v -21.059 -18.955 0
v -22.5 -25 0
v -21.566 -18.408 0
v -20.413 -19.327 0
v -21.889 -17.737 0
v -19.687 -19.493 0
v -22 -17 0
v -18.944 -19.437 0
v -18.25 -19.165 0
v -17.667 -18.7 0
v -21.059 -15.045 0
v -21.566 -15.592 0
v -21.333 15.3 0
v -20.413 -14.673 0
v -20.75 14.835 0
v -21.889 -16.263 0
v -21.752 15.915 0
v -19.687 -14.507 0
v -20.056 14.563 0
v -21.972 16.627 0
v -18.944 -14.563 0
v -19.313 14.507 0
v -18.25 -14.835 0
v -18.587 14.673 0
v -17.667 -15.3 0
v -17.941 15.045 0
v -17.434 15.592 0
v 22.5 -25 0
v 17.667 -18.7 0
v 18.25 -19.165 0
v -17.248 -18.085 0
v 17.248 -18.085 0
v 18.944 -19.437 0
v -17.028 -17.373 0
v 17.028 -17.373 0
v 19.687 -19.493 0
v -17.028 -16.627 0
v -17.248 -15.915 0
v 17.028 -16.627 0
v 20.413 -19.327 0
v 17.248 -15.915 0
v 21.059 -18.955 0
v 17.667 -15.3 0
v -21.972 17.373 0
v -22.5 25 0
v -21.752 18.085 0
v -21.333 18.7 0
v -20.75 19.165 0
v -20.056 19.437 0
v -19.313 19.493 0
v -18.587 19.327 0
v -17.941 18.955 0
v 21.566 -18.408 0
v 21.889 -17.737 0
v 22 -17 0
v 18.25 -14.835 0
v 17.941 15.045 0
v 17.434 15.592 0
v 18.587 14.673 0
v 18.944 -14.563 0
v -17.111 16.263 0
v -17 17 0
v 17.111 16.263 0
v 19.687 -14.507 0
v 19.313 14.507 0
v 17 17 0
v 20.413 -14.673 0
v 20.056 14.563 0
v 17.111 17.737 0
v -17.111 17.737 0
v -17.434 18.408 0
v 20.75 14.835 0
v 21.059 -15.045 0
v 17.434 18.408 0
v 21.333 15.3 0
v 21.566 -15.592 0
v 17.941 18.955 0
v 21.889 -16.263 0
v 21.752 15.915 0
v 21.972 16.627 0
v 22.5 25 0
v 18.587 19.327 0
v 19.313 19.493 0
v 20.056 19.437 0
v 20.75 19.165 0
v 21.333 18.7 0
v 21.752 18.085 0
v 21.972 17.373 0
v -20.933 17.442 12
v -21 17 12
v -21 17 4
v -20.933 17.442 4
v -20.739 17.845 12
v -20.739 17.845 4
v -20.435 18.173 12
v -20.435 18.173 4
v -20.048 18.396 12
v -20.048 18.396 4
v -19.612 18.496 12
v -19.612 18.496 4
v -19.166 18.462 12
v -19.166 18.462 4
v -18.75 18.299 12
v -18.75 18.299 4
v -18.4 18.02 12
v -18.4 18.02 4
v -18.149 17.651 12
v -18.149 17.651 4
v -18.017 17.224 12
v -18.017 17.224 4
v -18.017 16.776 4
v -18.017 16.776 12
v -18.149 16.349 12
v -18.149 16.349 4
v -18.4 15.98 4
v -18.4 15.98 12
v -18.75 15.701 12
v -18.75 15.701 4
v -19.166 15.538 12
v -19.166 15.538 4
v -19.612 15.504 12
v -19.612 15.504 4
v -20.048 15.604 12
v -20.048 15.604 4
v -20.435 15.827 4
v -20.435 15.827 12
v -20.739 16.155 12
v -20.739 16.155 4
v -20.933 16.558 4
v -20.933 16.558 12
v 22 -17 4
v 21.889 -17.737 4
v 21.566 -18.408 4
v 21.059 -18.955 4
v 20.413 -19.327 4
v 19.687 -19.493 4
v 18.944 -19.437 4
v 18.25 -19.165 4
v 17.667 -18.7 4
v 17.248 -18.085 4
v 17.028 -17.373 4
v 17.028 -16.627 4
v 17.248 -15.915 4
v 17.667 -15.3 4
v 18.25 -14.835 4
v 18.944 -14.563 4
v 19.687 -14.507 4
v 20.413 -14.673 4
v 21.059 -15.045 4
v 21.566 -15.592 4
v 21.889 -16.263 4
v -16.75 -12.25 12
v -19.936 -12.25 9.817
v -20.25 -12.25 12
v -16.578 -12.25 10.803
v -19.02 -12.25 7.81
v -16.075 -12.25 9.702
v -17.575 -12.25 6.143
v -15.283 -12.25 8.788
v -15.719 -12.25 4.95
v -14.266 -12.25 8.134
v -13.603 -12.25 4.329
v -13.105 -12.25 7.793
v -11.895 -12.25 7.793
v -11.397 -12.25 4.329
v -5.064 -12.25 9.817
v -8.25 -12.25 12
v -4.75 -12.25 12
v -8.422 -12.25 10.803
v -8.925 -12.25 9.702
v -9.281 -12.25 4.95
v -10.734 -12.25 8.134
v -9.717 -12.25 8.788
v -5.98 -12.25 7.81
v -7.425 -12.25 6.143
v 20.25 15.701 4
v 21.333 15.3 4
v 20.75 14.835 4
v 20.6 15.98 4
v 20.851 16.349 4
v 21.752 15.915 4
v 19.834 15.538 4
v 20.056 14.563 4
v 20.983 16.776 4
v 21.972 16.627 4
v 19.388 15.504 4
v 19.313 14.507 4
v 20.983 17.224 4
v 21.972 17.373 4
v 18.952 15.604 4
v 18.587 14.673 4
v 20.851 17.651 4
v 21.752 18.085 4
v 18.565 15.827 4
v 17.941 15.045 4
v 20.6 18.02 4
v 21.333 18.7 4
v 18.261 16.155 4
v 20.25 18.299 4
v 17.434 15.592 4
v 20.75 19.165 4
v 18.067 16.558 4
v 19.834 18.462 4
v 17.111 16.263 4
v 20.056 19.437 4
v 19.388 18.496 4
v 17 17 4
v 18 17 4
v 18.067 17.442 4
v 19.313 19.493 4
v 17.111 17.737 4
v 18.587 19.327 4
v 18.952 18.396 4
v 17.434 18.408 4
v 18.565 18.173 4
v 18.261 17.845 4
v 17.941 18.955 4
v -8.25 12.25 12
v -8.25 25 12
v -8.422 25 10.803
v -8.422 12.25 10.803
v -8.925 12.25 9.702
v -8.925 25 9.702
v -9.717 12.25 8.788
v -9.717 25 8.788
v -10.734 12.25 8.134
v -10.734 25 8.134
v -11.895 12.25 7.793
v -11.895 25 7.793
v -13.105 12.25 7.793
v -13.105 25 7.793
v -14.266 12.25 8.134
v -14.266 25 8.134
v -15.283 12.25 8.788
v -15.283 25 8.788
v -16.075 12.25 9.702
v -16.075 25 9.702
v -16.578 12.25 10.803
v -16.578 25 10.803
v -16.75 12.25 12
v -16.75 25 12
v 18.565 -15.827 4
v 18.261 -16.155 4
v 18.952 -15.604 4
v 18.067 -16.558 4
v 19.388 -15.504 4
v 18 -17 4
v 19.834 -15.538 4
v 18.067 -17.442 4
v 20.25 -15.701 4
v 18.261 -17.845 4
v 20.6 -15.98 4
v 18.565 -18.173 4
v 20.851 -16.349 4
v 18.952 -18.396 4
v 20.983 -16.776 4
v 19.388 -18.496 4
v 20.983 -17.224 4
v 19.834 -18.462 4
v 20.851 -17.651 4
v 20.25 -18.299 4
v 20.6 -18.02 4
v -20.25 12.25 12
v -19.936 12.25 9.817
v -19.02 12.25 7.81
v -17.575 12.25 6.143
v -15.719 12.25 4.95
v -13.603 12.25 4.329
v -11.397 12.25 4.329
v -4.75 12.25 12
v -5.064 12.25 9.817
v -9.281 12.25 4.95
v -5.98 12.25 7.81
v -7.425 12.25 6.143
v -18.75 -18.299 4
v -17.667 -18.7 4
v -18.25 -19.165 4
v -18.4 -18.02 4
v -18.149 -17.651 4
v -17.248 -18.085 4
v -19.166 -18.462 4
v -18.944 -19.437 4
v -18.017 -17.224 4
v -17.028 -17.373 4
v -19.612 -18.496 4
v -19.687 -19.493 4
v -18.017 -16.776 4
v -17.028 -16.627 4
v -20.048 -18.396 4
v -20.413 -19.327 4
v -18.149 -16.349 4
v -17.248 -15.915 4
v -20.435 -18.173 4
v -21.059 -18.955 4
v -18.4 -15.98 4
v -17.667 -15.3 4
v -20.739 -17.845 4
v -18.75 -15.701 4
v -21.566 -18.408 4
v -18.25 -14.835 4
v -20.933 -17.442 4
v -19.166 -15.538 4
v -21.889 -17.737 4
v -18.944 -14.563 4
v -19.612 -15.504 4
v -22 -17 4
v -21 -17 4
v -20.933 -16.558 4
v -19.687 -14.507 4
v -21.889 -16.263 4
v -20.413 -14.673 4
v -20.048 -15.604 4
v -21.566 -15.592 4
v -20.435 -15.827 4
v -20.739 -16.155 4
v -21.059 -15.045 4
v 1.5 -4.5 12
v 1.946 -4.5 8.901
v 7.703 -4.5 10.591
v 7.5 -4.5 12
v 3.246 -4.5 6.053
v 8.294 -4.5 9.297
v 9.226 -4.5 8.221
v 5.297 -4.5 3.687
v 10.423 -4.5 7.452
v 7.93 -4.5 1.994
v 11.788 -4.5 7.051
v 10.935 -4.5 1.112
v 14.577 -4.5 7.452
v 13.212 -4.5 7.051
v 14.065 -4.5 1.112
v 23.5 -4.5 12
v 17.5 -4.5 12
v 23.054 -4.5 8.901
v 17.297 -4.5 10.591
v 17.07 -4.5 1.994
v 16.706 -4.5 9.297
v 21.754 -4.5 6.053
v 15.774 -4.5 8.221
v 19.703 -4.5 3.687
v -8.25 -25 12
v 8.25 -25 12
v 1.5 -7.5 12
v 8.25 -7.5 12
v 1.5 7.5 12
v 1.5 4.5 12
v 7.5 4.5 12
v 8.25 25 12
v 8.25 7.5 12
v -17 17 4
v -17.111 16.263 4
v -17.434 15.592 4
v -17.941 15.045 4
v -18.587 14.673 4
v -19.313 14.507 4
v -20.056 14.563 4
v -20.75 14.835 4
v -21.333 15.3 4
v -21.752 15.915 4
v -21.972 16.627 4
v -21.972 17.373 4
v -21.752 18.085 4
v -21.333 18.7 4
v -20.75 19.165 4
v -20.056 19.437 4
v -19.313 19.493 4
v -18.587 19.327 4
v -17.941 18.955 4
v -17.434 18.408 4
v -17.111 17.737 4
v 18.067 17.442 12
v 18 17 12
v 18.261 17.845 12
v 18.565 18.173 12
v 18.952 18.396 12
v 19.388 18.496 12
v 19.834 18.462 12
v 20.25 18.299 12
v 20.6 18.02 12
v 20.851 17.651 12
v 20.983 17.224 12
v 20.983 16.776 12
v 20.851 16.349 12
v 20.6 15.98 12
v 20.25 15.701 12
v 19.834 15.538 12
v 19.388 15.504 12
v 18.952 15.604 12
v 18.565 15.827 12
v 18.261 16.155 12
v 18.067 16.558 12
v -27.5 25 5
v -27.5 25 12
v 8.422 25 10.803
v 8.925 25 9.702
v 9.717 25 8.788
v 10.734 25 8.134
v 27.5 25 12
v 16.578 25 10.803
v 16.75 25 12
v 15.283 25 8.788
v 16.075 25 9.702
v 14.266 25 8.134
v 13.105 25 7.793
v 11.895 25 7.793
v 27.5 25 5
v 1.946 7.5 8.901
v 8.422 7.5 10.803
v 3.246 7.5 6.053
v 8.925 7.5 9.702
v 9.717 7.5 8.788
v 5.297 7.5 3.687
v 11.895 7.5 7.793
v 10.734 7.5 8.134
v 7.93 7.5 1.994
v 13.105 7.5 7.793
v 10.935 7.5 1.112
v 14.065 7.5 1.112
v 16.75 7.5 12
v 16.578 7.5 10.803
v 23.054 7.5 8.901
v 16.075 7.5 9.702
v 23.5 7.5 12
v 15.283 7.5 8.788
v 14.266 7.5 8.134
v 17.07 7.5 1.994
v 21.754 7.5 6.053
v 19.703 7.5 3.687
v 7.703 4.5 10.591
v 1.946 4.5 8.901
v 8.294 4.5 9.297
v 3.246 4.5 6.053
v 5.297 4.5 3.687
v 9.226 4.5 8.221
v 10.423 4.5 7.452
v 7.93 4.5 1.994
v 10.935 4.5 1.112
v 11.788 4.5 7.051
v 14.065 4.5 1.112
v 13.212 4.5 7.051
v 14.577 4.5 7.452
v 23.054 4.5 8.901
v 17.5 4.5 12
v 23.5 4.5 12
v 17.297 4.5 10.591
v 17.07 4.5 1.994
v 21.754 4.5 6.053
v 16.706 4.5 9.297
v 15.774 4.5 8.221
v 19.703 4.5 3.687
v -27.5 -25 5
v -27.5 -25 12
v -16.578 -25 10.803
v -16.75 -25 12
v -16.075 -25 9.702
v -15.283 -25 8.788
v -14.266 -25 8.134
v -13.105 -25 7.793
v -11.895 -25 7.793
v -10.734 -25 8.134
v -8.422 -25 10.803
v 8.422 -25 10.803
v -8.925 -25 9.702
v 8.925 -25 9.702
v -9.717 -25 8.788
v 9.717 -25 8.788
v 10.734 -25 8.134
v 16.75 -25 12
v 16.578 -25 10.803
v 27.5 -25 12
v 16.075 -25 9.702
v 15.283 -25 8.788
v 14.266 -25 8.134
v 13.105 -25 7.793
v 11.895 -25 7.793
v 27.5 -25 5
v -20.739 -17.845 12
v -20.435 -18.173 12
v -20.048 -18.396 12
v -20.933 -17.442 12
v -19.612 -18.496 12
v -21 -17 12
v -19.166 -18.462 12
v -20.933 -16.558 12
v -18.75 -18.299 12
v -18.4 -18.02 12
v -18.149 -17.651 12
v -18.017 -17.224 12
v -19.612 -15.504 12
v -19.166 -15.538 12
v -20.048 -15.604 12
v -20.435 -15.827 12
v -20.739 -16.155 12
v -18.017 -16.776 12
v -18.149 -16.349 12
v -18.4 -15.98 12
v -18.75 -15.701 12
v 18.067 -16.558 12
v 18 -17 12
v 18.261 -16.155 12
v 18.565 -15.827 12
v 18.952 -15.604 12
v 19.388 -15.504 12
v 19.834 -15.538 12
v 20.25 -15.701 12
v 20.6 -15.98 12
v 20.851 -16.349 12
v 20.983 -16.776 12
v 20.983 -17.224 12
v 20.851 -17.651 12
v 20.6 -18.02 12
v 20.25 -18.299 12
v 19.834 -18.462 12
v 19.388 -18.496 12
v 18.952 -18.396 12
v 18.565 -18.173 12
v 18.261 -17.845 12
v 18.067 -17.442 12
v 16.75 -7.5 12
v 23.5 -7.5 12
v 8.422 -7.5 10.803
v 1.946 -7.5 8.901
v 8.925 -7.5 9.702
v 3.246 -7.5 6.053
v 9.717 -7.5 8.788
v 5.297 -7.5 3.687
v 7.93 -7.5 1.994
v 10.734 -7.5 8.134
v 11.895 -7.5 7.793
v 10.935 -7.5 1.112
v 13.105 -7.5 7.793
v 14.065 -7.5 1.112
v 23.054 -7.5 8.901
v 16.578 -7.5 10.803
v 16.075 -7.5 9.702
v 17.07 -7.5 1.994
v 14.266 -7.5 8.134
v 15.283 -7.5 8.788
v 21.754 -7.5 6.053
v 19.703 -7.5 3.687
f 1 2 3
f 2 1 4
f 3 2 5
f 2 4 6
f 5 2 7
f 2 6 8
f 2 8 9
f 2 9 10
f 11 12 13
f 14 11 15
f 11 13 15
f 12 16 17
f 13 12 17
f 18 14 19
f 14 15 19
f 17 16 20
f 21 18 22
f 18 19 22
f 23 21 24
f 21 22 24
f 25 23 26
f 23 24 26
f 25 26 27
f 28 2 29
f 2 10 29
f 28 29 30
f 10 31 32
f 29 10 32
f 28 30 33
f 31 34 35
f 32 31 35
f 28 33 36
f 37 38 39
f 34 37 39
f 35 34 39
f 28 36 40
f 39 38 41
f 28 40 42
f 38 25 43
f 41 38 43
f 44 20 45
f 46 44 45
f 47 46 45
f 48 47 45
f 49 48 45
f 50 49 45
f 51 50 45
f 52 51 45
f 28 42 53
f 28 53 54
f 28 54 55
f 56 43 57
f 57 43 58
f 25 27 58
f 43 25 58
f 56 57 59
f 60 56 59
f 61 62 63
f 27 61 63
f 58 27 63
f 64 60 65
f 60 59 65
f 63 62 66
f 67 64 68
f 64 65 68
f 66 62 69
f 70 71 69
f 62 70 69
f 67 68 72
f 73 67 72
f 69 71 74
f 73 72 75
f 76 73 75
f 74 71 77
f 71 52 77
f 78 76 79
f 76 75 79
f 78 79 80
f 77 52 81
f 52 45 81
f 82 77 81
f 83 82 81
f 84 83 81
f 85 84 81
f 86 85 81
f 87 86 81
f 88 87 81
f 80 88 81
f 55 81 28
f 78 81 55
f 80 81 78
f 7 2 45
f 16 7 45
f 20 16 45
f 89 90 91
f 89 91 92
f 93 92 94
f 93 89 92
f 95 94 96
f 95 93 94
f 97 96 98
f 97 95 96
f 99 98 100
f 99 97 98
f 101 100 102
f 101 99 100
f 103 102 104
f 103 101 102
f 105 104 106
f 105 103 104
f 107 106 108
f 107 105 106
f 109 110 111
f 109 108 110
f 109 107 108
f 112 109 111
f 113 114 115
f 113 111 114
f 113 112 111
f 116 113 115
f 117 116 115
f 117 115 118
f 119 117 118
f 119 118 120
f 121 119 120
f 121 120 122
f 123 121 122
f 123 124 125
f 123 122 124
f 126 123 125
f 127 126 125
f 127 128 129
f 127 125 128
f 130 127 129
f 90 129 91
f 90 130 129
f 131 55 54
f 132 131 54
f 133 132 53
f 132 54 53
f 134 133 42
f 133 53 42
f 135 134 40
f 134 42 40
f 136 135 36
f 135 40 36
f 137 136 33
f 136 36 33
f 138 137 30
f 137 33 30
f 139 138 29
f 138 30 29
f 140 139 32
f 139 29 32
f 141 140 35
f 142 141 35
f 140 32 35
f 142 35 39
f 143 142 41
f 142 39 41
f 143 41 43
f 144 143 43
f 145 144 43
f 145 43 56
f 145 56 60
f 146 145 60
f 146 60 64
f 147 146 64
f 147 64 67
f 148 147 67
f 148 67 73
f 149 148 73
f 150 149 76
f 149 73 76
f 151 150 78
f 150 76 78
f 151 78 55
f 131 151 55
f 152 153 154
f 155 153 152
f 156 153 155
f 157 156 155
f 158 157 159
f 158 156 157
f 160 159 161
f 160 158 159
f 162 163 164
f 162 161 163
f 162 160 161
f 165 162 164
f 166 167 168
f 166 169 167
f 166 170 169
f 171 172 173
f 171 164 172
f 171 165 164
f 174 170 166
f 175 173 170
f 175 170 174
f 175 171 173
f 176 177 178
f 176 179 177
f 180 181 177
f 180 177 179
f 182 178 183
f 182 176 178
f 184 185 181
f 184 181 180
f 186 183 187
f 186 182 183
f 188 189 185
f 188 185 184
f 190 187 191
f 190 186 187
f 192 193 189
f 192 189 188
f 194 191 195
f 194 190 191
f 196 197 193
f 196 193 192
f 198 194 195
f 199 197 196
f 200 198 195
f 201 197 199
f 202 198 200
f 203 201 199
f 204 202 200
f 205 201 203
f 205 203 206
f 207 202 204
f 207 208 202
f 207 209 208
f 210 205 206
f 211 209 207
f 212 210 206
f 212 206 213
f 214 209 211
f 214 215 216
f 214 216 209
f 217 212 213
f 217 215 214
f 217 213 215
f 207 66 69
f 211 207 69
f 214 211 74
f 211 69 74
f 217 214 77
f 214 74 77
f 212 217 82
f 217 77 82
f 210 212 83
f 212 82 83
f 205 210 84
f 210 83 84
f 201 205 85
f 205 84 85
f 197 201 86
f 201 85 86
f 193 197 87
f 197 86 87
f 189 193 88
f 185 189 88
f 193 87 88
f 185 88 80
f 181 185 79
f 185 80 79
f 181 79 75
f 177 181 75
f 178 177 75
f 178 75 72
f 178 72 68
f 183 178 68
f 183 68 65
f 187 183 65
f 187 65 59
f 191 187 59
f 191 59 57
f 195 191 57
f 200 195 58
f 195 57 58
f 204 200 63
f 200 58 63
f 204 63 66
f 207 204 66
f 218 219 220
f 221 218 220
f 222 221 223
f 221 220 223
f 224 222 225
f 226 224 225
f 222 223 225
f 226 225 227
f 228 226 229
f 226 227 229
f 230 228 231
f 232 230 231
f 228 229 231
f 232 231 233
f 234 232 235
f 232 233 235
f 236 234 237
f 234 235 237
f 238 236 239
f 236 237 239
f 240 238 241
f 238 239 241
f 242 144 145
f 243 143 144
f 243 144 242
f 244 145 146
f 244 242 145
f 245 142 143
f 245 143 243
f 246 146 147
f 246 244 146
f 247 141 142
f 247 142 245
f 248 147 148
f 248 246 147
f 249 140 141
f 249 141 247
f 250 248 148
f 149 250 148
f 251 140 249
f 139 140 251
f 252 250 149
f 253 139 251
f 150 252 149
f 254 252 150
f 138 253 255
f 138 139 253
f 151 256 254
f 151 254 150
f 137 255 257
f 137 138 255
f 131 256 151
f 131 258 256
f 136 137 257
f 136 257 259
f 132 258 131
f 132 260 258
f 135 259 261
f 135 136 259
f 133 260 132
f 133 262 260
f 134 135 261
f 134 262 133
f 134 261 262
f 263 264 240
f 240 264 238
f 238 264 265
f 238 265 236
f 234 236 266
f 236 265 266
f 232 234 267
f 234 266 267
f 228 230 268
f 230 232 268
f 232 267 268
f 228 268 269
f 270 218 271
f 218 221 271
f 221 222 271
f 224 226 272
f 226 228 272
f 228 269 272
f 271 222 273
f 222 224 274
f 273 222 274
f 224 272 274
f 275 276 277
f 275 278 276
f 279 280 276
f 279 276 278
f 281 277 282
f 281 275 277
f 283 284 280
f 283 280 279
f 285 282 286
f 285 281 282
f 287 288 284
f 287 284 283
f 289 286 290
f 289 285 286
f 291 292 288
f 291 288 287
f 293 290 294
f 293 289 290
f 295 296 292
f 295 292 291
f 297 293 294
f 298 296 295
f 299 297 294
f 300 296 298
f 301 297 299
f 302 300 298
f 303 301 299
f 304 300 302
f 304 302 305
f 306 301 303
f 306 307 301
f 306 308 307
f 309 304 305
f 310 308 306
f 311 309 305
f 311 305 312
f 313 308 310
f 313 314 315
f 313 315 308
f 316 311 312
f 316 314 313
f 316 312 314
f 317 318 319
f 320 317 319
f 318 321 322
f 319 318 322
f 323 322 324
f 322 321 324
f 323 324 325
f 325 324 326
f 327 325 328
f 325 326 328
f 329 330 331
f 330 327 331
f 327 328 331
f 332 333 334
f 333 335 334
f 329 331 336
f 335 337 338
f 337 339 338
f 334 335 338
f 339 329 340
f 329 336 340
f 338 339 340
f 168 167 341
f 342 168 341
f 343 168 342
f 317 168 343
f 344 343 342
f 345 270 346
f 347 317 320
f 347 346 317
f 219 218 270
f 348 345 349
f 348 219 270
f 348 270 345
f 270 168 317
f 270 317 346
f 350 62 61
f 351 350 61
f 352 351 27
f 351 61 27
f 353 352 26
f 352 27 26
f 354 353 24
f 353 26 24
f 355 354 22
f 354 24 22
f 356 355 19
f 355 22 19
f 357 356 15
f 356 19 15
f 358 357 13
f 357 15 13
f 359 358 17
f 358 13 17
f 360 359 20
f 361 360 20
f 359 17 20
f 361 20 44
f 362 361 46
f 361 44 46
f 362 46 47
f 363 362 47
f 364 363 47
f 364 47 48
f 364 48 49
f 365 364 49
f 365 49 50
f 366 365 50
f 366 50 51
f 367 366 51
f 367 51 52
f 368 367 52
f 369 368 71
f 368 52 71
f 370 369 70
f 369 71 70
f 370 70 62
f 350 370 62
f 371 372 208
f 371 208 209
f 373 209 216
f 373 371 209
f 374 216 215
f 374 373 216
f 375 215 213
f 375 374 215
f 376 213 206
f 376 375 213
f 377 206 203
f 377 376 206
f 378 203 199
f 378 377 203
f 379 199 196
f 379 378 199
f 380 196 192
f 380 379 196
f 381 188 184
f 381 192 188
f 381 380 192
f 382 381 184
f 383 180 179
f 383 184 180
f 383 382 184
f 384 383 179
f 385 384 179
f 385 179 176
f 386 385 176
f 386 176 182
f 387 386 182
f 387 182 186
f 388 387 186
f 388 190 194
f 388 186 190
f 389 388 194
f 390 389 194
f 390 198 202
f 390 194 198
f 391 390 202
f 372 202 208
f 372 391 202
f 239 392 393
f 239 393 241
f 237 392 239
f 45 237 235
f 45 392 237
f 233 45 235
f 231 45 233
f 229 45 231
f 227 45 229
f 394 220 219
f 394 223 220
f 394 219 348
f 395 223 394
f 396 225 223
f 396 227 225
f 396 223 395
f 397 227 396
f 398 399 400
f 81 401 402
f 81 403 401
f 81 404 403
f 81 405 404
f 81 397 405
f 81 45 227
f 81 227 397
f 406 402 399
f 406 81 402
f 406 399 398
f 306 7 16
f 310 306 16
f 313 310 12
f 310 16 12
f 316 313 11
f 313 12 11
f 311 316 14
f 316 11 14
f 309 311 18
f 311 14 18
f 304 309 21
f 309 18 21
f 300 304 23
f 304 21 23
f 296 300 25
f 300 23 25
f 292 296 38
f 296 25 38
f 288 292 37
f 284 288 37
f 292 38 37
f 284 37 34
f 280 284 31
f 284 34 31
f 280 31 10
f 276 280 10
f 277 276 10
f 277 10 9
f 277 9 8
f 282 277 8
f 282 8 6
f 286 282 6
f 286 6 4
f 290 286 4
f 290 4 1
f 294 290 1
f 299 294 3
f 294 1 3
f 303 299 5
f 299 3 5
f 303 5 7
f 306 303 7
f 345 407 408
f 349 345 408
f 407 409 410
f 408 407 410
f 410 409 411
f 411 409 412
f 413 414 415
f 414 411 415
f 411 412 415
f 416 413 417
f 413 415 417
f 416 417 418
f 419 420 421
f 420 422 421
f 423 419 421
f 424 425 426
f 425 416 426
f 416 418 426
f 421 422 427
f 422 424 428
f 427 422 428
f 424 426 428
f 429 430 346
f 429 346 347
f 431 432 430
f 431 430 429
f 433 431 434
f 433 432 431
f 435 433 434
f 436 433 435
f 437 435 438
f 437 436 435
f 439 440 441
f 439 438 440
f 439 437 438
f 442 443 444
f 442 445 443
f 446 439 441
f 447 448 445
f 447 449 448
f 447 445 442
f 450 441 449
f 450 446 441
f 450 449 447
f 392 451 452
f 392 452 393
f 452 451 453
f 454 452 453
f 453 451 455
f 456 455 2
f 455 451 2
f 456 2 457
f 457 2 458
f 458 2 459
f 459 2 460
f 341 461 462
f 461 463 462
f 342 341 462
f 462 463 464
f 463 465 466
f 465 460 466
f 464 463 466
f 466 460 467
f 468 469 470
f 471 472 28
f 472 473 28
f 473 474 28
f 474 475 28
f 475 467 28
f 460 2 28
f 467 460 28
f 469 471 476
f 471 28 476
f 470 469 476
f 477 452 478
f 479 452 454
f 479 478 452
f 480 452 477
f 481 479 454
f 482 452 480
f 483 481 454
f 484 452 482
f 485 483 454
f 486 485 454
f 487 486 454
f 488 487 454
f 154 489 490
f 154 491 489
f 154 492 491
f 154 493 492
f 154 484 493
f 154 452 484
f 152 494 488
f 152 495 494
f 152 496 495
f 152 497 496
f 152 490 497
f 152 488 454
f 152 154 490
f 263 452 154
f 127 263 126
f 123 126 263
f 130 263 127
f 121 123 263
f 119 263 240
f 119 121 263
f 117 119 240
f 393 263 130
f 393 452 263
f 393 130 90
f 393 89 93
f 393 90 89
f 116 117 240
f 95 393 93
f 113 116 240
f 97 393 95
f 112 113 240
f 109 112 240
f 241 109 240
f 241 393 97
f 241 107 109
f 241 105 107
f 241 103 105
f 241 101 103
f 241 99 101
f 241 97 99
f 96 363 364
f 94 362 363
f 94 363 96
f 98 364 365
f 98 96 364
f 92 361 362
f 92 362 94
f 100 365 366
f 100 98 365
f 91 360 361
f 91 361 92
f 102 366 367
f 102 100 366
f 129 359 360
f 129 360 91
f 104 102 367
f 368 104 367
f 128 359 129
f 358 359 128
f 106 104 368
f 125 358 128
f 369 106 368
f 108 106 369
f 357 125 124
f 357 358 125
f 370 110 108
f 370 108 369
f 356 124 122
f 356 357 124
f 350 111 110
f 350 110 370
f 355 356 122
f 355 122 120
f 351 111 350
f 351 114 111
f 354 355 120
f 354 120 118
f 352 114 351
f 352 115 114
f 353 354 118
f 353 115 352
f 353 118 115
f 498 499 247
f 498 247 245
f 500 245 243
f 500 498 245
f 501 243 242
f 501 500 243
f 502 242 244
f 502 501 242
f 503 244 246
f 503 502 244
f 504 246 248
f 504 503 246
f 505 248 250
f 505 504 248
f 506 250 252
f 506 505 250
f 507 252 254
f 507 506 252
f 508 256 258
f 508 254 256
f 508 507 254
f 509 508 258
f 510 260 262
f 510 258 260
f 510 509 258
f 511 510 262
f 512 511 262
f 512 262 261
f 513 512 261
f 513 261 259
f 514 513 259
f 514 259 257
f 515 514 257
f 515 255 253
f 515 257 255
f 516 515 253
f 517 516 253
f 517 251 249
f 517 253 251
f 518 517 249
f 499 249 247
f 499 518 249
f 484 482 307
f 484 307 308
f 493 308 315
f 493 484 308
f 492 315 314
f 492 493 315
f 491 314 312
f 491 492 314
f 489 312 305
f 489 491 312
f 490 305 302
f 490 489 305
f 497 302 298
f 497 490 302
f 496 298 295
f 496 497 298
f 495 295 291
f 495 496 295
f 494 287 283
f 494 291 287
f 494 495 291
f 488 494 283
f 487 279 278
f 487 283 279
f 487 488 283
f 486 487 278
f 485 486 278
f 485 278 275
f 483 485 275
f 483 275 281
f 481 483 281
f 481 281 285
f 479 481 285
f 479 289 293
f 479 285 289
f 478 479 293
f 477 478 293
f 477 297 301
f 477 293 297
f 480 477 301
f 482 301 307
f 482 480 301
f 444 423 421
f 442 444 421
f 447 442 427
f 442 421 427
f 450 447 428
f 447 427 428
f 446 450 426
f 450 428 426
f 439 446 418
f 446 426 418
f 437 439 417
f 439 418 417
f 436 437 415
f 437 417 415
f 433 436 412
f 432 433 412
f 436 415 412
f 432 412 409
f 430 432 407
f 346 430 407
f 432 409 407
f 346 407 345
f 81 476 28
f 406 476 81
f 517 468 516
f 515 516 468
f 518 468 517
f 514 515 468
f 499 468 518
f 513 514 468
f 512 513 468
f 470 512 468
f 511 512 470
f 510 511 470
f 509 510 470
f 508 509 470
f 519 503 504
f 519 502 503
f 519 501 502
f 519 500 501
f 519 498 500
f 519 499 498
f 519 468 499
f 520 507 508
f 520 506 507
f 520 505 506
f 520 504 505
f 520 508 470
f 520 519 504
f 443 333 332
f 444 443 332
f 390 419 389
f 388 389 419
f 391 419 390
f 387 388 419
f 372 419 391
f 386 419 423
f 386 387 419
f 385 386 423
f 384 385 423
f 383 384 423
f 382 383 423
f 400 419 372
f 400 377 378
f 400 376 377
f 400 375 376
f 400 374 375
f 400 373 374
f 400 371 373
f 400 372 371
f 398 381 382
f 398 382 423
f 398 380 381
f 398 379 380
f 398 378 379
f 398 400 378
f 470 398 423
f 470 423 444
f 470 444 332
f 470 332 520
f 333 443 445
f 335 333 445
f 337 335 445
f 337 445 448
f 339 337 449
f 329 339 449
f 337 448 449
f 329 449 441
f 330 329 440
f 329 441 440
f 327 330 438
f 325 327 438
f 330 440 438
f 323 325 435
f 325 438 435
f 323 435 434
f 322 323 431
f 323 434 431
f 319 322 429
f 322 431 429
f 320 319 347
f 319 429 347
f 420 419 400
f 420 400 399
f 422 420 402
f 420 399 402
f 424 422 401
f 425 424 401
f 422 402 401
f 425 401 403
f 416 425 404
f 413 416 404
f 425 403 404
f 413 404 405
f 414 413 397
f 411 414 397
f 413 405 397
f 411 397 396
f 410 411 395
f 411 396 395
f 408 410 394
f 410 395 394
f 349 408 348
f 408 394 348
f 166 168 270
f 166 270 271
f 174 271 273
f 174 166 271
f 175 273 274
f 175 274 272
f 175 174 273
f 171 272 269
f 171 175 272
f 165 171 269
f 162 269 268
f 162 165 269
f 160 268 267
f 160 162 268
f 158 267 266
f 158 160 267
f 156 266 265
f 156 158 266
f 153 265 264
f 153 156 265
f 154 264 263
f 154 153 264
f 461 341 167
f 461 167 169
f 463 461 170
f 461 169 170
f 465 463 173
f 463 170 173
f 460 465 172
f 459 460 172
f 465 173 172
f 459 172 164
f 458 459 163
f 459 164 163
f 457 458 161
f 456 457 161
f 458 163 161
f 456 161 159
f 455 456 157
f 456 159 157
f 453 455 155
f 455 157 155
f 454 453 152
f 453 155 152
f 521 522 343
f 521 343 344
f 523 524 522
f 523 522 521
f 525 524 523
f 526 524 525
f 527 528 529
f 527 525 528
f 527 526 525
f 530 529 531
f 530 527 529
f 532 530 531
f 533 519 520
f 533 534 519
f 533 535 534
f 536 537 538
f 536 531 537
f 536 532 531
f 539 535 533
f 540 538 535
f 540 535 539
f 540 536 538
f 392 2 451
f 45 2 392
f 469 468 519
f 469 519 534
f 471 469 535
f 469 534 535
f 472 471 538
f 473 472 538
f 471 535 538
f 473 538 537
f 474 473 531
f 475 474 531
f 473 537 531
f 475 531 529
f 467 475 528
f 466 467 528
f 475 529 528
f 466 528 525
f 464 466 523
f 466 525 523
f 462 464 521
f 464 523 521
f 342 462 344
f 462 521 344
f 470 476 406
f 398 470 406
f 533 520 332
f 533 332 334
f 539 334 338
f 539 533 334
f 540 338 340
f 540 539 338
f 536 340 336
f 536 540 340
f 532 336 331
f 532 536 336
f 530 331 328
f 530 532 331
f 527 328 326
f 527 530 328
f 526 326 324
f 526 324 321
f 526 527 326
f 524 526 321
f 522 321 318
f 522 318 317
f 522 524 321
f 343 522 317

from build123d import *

# Parameters (mm, degrees)
ESQUISSE1_W                  = 55
ESQUISSE1_H                  = 50
BOSS_EXTRU_1_DEPTH           = 12
ESQUISSE2_R                  = 4.25
ENL_V_MAT_EXTRU_1_DEPTH      = 59.311662641
ENL_V_MAT_EXTRU_2_DEPTH      = 12.25
ENL_V_MAT_EXTRU_2_DEPTH_BACK = 12.25
ESQUISSE3_R                  = 7.75
ESQUISSE4_R                  = 11
ENL_V_MAT_EXTRU_3_DEPTH      = 3
ESQUISSE5_R                  = 5
ENL_V_MAT_EXTRU_4_DEPTH      = 15
ENL_V_MAT_EXTRU_5_DEPTH      = 40.05444917
ENL_V_MAT_EXTRU_5_DEPTH_BACK = 40.05444917
ESQUISSE6_R                  = 1.5
ESQUISSE7_R                  = 2.5
ENL_V_MAT_EXTRU_6_DEPTH      = 4
CHANFREIN3_SIZE              = 5


with BuildPart() as part:
    # Esquisse1 → Boss.-Extru.1 (new body)
    with BuildSketch(Plane.XY):
        Rectangle(ESQUISSE1_W, ESQUISSE1_H)
    extrude(amount=BOSS_EXTRU_1_DEPTH)

    # Esquisse2 → Enlèv. mat.-Extru.1 (cut, through all)
    with BuildSketch(Plane(origin=(0, 25, 0), x_dir=(1, 0, 0), z_dir=(0, 1, 0))):
        with Locations((-12.5, -12)):
            Circle(ESQUISSE2_R)
        with Locations((12.5, -12)):
            Circle(ESQUISSE2_R)
    extrude(amount=-ENL_V_MAT_EXTRU_1_DEPTH, mode=Mode.SUBTRACT)

    # Esquisse3 → Enlèv. mat.-Extru.2 (cut, two sides: drawn at the far end of the back side and taken through both)
    with BuildSketch(Plane(origin=(0, 0, 0), x_dir=(1, 0, 0), z_dir=(0, 1, 0)).offset(-ENL_V_MAT_EXTRU_2_DEPTH_BACK)):
        with Locations((-12.5, -12)):
            Circle(ESQUISSE3_R)
    extrude(amount=ENL_V_MAT_EXTRU_2_DEPTH + ENL_V_MAT_EXTRU_2_DEPTH_BACK, mode=Mode.SUBTRACT)

    # Esquisse4 → Enlèv. mat.-Extru.3 (cut)
    with BuildSketch(Plane(origin=(0, 7.5, 0), x_dir=(1, 0, 0), z_dir=(0, 1, 0))):
        with Locations((12.5, -12)):
            Circle(ESQUISSE4_R)
    enl_v_mat_extru_3 = extrude(amount=-ENL_V_MAT_EXTRU_3_DEPTH, mode=Mode.SUBTRACT)

    # Esquisse5 → Enlèv. mat.-Extru.4 (cut)
    with BuildSketch(Plane(origin=(0, 7.5, 0), x_dir=(1, 0, 0), z_dir=(0, 1, 0))):
        with Locations((12.5, -12)):
            Circle(ESQUISSE5_R)
    extrude(amount=-ENL_V_MAT_EXTRU_4_DEPTH, mode=Mode.SUBTRACT)

    # Esquisse6 → Enlèv. mat.-Extru.5 (cut, two sides: drawn at the far end of the back side and taken through both)
    with BuildSketch(Plane(origin=(0, 0, 0), x_dir=(-1, 0, 0), z_dir=(0, 0, -1)).offset(-ENL_V_MAT_EXTRU_5_DEPTH_BACK)):
        with Locations((19.5, -17)):
            Circle(ESQUISSE6_R)
        with Locations((-19.5, -17)):
            Circle(ESQUISSE6_R)
        with Locations((-19.5, 17)):
            Circle(ESQUISSE6_R)
        with Locations((19.5, 17)):
            Circle(ESQUISSE6_R)
    extrude(amount=ENL_V_MAT_EXTRU_5_DEPTH + ENL_V_MAT_EXTRU_5_DEPTH_BACK, mode=Mode.SUBTRACT)

    # Esquisse7 → Enlèv. mat.-Extru.6 (cut)
    with BuildSketch(Plane(origin=(0, 0, 0), x_dir=(-1, 0, 0), z_dir=(0, 0, -1))):
        with Locations((19.5, -17)):
            Circle(ESQUISSE7_R)
        with Locations(Location((19.5, 17, 0), (0, 0, 180))):
            Circle(ESQUISSE7_R)
        with Locations((-19.5, 17)):
            Circle(ESQUISSE7_R)
        with Locations(Location((-19.5, -17, 0), (0, 0, 180))):
            Circle(ESQUISSE7_R)
    extrude(amount=-ENL_V_MAT_EXTRU_6_DEPTH, mode=Mode.SUBTRACT)

    # Chanfrein3
    chanfrein3_edges = [part.edges().sort_by_distance(p)[0] for p in [
        (-27.5, 0, 0),
        (27.5, 0, 0),
    ]]
    chamfer(chanfrein3_edges, length=CHANFREIN3_SIZE)

    # Symétrie2: Enlèv. mat.-Extru.3 across plane
    add(enl_v_mat_extru_3.mirror(Plane.ZX), mode=Mode.SUBTRACT)


solid = part.part
